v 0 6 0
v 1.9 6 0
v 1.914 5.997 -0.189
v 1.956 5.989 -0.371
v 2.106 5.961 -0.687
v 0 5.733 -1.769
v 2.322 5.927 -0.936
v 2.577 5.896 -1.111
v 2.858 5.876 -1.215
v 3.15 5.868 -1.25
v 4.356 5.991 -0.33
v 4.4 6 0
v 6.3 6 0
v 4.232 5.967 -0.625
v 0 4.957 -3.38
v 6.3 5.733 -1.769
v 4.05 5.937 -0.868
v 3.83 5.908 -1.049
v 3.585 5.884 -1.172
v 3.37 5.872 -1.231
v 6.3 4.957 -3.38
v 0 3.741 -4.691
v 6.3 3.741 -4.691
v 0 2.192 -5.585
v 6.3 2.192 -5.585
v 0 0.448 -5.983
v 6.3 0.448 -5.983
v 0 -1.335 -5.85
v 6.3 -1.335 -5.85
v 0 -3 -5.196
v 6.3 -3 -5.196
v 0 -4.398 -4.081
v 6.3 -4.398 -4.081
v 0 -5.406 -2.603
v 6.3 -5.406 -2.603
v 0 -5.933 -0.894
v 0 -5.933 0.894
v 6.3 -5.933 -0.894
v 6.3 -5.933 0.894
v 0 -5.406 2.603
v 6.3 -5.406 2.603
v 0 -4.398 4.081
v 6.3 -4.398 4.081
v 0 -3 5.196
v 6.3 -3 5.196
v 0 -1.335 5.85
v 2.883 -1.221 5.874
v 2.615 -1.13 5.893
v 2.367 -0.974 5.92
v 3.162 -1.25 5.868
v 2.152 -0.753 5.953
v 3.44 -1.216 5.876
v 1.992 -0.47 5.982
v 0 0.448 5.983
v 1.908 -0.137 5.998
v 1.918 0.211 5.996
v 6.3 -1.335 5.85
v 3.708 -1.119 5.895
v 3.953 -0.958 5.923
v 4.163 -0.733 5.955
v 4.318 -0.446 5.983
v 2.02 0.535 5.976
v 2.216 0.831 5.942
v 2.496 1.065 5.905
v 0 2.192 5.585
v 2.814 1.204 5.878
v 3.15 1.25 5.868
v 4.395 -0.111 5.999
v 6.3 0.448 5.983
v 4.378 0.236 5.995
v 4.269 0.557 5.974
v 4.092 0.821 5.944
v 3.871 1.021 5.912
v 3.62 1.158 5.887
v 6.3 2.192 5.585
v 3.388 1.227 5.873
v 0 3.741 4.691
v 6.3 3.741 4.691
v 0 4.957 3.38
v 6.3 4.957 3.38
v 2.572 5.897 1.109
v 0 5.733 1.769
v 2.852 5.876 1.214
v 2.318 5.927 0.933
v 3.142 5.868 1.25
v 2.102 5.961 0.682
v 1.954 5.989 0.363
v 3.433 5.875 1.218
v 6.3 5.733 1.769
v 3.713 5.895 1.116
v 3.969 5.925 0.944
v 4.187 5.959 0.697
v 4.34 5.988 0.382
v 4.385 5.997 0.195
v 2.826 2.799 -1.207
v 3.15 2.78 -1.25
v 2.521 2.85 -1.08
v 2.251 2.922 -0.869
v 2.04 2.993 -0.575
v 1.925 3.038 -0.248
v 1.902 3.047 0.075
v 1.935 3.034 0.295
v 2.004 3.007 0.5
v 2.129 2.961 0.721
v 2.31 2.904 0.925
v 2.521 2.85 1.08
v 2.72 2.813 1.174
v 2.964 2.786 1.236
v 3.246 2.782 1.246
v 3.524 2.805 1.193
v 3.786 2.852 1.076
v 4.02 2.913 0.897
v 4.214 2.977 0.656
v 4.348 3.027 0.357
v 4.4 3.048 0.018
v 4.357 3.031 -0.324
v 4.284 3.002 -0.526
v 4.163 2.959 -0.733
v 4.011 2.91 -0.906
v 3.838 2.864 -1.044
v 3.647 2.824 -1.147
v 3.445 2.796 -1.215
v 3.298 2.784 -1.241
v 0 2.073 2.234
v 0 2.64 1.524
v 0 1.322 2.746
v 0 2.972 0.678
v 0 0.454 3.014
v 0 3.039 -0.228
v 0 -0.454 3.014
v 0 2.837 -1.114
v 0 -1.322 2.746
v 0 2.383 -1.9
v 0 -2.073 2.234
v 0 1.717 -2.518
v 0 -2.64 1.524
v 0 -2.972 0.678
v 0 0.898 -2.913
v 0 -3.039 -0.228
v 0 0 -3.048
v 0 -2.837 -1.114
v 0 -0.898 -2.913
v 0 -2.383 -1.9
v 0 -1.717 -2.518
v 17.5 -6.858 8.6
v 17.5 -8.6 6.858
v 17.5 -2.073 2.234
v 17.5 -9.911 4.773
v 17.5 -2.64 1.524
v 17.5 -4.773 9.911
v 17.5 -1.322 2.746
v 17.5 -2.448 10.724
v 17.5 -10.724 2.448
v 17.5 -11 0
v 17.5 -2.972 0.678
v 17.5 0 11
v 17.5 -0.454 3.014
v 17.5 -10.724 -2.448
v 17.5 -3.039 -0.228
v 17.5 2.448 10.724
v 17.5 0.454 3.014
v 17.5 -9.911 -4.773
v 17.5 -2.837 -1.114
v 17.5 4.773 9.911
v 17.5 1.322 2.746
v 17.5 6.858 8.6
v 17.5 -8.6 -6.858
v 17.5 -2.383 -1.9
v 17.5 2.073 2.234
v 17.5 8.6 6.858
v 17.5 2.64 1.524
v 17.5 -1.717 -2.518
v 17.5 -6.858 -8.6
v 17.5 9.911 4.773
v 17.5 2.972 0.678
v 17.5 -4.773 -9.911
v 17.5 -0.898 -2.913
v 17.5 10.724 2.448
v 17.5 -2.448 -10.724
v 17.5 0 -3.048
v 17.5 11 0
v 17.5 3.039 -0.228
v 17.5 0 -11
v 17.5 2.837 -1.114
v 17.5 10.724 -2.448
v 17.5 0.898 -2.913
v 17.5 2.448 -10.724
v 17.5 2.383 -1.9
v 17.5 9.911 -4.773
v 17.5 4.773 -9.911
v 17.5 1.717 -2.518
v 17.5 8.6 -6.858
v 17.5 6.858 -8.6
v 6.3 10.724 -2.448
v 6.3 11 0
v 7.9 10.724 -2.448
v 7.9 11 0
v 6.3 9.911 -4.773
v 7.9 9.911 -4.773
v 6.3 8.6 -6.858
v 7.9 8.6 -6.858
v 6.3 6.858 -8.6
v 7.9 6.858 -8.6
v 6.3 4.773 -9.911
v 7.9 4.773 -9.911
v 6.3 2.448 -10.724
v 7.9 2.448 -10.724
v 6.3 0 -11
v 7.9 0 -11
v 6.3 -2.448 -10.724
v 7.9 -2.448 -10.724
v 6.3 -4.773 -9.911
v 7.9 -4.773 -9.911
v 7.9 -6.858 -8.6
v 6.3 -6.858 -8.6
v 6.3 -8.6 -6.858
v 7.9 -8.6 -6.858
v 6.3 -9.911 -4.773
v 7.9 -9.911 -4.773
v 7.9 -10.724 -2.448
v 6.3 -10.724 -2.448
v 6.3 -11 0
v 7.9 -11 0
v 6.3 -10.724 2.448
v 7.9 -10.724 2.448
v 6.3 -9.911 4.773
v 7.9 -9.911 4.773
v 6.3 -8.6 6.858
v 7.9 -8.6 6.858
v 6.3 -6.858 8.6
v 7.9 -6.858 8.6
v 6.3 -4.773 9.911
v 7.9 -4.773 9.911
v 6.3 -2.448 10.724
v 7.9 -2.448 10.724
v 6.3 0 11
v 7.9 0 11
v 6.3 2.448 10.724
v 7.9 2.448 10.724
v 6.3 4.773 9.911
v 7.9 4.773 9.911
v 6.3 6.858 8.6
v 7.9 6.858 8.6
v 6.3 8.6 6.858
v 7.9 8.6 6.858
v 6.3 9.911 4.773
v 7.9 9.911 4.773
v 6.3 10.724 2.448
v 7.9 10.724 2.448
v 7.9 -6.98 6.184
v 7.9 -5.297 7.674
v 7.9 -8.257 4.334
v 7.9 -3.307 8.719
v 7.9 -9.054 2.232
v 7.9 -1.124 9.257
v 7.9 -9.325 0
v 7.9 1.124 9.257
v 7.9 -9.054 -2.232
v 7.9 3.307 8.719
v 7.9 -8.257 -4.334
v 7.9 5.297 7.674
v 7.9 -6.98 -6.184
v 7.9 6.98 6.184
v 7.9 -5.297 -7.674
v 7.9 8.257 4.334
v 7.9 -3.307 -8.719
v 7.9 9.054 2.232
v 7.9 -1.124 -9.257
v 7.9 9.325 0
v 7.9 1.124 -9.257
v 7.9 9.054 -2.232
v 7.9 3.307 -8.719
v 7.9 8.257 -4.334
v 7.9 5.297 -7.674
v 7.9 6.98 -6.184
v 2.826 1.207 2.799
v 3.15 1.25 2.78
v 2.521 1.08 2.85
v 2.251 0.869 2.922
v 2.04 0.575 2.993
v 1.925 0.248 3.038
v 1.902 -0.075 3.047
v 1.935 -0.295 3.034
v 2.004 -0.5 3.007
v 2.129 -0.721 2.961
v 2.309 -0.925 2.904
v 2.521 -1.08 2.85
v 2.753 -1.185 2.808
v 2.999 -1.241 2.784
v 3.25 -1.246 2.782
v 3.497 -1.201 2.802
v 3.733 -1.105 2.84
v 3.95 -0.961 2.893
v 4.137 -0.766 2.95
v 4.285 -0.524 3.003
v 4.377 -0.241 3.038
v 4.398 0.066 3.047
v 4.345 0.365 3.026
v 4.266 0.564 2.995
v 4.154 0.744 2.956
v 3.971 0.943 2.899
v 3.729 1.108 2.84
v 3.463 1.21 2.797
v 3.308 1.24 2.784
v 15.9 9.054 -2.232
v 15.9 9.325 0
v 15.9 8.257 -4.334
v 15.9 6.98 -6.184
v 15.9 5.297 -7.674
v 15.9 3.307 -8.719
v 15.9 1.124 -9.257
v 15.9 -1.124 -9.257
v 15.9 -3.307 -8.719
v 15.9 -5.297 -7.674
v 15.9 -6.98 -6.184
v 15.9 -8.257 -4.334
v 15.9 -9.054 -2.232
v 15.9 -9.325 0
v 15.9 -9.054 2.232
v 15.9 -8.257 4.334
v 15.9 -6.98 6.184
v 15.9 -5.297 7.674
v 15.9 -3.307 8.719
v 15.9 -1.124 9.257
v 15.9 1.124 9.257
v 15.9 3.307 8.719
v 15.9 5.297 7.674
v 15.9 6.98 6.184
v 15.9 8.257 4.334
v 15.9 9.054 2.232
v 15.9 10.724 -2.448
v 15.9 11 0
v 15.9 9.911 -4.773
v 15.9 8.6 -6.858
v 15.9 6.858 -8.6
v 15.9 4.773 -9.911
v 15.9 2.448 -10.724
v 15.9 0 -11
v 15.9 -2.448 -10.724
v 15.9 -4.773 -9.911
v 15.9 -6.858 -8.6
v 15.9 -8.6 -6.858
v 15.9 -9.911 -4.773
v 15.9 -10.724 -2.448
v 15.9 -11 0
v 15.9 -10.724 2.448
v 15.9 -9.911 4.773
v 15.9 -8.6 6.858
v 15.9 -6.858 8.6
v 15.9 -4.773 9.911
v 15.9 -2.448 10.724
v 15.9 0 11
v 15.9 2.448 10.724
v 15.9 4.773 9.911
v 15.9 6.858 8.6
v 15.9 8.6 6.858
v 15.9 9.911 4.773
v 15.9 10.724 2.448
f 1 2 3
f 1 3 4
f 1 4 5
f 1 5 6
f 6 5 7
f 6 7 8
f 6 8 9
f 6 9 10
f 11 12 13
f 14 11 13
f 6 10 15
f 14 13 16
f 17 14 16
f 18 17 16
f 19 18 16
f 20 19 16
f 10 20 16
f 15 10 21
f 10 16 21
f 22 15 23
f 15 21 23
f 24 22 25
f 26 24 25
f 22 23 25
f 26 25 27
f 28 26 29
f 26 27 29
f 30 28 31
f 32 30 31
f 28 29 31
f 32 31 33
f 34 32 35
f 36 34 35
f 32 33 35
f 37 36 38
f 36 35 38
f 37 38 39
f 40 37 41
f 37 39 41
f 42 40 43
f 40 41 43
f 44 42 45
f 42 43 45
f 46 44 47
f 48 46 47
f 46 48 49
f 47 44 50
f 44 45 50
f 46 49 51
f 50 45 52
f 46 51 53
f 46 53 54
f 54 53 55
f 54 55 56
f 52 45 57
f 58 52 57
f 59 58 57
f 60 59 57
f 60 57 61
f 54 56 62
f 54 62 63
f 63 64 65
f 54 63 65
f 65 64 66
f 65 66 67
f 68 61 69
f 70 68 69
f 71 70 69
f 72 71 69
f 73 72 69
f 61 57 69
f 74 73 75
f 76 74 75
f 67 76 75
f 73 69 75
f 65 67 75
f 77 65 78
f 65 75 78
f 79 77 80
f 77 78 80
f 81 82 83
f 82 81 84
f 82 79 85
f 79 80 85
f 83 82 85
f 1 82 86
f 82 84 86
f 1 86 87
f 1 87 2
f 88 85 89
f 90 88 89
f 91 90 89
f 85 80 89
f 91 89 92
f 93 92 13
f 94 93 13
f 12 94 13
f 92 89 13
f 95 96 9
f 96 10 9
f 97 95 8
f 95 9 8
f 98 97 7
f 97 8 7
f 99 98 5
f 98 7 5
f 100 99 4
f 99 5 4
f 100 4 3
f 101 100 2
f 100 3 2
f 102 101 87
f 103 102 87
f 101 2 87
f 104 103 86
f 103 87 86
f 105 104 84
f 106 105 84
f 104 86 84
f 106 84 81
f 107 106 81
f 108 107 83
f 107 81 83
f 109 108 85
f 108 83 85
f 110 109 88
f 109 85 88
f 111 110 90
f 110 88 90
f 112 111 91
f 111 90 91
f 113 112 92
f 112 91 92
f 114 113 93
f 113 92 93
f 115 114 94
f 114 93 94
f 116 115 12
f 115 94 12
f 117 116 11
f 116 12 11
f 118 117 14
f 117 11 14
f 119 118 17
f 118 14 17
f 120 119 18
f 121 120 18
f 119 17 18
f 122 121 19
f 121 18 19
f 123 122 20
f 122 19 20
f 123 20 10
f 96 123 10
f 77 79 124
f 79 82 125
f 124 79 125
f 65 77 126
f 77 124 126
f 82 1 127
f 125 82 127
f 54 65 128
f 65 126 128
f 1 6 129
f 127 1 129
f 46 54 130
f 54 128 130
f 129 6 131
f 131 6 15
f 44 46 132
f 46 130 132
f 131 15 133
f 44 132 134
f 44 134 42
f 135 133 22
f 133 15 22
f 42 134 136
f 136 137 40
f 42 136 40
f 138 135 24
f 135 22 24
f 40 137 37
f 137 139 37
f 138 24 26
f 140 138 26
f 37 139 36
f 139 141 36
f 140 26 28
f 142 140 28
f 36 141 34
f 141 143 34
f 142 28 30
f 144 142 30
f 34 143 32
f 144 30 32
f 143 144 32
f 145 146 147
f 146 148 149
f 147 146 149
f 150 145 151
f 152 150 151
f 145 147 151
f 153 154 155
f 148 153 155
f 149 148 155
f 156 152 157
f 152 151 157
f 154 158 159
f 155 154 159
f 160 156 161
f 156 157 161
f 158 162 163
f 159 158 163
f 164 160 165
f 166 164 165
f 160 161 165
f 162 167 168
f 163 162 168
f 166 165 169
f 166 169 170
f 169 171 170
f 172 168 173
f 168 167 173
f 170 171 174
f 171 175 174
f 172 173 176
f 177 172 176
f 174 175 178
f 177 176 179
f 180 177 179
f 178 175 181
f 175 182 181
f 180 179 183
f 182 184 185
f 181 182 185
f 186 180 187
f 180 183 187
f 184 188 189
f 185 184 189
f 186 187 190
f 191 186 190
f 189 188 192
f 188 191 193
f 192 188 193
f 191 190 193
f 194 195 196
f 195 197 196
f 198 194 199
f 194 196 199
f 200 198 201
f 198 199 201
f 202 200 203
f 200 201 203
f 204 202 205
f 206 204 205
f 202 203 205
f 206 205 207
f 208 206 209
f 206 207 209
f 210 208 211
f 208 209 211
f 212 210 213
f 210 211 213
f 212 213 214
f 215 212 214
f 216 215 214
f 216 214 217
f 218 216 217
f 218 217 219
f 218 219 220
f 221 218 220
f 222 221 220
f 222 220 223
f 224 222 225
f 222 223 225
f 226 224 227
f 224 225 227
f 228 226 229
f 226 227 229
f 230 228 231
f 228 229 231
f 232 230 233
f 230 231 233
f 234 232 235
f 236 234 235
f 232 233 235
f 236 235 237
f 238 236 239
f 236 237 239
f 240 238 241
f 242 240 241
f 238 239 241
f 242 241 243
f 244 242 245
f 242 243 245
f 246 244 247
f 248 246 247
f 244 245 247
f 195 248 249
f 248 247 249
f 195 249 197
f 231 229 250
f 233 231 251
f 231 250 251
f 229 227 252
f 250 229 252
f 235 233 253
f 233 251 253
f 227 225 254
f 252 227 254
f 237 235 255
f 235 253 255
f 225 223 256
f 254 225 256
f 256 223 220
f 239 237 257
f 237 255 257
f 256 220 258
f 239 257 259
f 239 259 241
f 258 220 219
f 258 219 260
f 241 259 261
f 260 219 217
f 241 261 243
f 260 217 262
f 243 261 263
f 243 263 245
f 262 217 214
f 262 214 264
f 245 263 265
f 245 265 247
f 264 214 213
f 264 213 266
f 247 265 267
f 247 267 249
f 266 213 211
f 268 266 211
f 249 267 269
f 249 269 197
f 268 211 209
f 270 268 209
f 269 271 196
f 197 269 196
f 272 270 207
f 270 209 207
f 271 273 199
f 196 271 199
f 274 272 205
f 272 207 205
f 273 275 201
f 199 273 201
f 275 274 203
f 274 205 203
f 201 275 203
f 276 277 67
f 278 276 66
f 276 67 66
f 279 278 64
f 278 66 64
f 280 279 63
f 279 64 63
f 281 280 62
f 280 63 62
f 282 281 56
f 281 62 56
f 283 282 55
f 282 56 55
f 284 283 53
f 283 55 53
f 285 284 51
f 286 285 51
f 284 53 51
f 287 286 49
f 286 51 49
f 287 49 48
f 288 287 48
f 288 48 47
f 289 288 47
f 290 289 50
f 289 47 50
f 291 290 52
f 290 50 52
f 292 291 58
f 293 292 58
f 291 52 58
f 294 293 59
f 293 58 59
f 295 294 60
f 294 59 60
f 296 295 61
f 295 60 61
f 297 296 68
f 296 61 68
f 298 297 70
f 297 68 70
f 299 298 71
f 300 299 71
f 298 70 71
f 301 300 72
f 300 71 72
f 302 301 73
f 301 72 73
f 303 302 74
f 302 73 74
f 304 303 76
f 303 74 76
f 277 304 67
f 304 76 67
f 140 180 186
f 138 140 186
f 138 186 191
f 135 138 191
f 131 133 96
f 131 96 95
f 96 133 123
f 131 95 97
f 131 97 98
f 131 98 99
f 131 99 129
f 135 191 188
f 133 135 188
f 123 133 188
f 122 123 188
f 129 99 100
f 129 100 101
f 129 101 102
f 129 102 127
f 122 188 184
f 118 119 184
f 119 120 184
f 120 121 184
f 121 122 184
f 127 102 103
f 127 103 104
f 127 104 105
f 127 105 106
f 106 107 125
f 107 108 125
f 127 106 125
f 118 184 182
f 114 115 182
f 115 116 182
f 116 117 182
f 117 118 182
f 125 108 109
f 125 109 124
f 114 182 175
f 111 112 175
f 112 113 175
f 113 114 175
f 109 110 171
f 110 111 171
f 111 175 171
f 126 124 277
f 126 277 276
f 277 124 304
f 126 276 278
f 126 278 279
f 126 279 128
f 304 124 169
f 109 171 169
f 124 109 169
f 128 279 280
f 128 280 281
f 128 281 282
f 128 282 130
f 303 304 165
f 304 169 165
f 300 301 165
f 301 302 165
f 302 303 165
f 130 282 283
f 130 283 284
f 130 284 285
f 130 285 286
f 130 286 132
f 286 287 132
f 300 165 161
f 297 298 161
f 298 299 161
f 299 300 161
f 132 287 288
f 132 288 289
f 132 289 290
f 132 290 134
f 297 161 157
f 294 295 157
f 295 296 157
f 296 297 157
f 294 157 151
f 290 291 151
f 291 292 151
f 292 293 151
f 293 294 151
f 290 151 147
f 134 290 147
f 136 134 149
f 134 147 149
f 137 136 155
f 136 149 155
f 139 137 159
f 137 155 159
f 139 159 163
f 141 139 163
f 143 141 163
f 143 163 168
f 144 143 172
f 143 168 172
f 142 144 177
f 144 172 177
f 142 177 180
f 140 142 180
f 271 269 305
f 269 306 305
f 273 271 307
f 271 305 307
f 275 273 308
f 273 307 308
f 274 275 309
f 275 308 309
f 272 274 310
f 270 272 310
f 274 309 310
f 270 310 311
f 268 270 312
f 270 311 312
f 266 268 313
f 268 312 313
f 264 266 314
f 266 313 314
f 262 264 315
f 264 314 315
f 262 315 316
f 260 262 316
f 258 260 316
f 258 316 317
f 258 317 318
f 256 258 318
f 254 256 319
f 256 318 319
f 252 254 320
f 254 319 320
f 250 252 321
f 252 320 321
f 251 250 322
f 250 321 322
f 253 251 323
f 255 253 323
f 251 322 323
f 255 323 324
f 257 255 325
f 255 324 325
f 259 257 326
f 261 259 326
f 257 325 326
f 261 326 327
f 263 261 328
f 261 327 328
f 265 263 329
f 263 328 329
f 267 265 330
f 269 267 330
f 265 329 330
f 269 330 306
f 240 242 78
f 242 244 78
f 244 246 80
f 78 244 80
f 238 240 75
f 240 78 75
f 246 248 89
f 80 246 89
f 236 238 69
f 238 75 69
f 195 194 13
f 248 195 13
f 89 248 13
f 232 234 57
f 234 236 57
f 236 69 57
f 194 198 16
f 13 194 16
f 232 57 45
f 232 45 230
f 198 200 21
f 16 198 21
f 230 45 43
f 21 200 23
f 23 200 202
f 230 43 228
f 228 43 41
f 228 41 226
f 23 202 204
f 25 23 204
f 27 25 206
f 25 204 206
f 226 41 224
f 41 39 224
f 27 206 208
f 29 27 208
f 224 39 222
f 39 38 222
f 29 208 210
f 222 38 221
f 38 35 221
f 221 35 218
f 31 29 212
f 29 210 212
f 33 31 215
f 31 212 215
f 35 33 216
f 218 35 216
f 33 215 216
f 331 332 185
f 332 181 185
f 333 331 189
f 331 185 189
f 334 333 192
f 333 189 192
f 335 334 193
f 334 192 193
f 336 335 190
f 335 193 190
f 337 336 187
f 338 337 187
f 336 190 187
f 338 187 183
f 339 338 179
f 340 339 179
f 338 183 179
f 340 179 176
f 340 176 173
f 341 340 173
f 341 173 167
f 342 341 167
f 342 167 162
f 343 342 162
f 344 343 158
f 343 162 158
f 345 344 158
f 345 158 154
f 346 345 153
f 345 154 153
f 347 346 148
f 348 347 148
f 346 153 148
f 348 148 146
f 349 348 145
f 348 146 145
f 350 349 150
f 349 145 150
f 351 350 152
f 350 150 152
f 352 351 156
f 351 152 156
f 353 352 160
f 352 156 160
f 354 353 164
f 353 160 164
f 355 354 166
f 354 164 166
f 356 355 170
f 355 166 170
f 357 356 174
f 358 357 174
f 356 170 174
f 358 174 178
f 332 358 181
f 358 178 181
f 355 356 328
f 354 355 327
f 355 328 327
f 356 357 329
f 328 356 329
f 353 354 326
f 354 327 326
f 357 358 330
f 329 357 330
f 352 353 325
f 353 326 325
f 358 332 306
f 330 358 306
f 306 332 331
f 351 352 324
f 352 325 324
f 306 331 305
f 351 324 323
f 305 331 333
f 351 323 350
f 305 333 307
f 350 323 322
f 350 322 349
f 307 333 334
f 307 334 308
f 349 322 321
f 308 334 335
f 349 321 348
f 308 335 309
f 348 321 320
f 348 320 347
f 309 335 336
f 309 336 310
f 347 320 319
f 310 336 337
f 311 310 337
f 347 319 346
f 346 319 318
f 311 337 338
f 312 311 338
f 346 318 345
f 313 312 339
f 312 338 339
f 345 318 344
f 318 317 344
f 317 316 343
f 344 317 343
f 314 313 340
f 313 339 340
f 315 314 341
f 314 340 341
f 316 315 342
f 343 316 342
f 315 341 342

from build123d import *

# Parameters (mm, degrees)
SKETCH2_W          = 1.25
SKETCH2_H          = 11
SKETCH4_W          = 1.25
SKETCH4_H          = 11
SKETCH6_R          = 3.048
CUT_EXTRUDE1_DEPTH = 18.5000001


with BuildPart() as part:
    # Sketch1 → Revolve1 (revolve)
    with BuildSketch(Plane.XY):
        Polygon((0, 2.5), (0, 6), (6.3, 6), (6.3, 11), (7.9, 11), (7.9, 9.325), (15.9, 9.325), (15.9, 11), (17.5, 11), (17.5, 2.5), align=None)
    revolve(axis=Axis((0, 0, 0), (-1, 0, 0)))

    # Sketch2 → M3x0.5 Tapped Hole1 (revolve, cut)
    with BuildSketch(Plane(origin=(3.15, 0, 0), x_dir=(0, 0, -1), z_dir=(1, 0, 0))):
        with Locations((0.625, 5.5)):
            Rectangle(SKETCH2_W, SKETCH2_H)
    revolve(axis=Axis((3.15, -6.35, 0), (0, 1, 0)), mode=Mode.SUBTRACT)

    # Sketch4 → M3x0.5 Tapped Hole2 (revolve, cut)
    with BuildSketch(Plane.YZ.offset(3.15)):
        with Locations((0.625, 5.5)):
            Rectangle(SKETCH4_W, SKETCH4_H)
    revolve(axis=Axis((3.15, 0, -6.35), (0, 0, 1)), mode=Mode.SUBTRACT)

    # Sketch6 → Cut-Extrude1 (cut, through all)
    with BuildSketch(Plane(origin=(17.5, 0, 0), x_dir=(0, 0, -1), z_dir=(1, 0, 0))):
        Circle(SKETCH6_R)
    extrude(amount=-CUT_EXTRUDE1_DEPTH, mode=Mode.SUBTRACT)


solid = part.part
